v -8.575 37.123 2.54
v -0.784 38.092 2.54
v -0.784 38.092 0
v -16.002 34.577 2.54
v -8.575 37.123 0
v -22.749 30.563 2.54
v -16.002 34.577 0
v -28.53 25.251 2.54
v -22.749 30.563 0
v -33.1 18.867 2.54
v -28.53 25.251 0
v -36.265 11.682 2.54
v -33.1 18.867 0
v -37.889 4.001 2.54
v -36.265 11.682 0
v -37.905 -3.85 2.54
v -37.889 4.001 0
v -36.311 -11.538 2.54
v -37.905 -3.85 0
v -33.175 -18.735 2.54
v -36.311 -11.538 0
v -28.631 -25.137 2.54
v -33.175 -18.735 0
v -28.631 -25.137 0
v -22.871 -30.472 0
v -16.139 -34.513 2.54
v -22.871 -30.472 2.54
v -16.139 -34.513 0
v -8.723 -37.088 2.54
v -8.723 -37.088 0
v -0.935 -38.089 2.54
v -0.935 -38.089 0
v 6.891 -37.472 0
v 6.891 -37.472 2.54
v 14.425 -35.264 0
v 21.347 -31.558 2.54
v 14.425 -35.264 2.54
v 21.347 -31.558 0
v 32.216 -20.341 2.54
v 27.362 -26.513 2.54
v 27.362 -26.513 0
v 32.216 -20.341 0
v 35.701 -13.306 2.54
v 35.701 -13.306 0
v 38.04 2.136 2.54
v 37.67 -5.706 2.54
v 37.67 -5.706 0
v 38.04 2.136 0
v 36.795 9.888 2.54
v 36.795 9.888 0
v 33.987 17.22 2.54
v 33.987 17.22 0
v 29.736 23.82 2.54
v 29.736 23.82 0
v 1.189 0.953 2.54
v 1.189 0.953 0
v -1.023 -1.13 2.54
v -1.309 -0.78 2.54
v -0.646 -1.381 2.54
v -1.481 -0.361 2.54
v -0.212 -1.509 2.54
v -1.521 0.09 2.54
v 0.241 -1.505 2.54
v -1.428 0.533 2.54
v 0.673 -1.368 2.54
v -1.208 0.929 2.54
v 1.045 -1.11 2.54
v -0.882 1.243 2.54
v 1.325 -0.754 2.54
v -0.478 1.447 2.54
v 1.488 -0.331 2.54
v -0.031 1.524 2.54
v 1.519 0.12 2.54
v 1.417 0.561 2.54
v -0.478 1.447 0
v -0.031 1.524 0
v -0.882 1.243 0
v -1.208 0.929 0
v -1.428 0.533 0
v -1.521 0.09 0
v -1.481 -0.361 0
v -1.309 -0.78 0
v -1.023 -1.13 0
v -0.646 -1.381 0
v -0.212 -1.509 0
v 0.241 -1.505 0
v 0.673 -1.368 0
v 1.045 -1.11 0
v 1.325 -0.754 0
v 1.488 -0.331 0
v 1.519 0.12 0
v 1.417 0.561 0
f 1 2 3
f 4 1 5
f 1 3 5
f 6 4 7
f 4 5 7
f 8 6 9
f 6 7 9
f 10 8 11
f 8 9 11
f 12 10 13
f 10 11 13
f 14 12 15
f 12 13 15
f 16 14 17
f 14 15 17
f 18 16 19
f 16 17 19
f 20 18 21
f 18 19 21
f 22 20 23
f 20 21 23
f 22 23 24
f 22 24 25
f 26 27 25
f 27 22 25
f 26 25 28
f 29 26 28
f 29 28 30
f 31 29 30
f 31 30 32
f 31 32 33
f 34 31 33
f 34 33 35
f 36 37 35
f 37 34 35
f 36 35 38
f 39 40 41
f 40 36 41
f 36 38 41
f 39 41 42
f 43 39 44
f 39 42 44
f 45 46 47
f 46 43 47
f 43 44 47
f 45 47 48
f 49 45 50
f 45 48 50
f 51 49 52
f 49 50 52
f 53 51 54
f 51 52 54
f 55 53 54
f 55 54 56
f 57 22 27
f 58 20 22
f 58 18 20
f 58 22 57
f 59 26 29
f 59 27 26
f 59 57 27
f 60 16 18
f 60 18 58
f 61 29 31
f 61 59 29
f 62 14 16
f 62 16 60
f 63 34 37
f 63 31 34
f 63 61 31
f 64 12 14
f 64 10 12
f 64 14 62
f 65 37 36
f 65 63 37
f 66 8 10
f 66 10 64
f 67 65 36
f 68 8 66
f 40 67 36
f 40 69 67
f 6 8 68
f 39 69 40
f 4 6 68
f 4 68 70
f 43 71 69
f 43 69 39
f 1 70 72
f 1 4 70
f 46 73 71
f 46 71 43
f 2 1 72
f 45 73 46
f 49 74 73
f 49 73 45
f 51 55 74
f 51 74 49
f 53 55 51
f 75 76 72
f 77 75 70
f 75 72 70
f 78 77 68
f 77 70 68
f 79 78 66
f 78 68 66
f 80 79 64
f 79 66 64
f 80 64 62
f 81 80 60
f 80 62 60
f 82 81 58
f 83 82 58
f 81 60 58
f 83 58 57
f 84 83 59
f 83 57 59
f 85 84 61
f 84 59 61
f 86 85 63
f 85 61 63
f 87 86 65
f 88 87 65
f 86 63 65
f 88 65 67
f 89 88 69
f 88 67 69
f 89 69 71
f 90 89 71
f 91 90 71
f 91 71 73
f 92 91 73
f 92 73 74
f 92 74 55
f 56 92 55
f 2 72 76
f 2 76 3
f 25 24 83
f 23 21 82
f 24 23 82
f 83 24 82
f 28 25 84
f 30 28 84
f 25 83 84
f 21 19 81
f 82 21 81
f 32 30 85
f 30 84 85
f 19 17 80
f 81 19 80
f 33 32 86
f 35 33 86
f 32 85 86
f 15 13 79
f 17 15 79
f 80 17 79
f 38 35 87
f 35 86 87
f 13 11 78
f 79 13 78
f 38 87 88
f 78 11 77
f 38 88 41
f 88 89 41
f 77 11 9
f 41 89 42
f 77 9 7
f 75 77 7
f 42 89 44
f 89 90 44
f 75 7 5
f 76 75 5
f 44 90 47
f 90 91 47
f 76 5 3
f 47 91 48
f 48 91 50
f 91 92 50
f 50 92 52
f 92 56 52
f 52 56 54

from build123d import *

# Parameters (mm, degrees)
SKETCH1_R           = 38.1
BOSS_EXTRUDE1_DEPTH = 2.54
CUT_EXTRUDE1_DEPTH  = 2.54
SKETCH3_R           = 1.524
CUT_EXTRUDE2_DEPTH  = 2.54


with BuildPart() as part:
    # Sketch1 → Boss-Extrude1 (new body)
    with BuildSketch(Plane.XY):
        Circle(SKETCH1_R)
    extrude(amount=BOSS_EXTRUDE1_DEPTH)

    # Sketch2 → Cut-Extrude1 (cut)
    with BuildSketch(Plane.XY.offset(2.54)):
        with BuildLine():
            Line((0, 0), (-0.783784717, 38.091937225))
            ThreePointArc((-0.783784717, 38.091937225), (16.139227372, 34.512828627), (29.735705264, 23.820114031))
            Line((29.735705264, 23.820114031), (0, 0))
        make_face()
    extrude(amount=-CUT_EXTRUDE1_DEPTH, mode=Mode.SUBTRACT)

    # Sketch3 → Cut-Extrude2 (cut)
    with BuildSketch(Plane.XY.offset(2.54)):
        Circle(SKETCH3_R)
    extrude(amount=-CUT_EXTRUDE2_DEPTH, mode=Mode.SUBTRACT)


solid = part.part
